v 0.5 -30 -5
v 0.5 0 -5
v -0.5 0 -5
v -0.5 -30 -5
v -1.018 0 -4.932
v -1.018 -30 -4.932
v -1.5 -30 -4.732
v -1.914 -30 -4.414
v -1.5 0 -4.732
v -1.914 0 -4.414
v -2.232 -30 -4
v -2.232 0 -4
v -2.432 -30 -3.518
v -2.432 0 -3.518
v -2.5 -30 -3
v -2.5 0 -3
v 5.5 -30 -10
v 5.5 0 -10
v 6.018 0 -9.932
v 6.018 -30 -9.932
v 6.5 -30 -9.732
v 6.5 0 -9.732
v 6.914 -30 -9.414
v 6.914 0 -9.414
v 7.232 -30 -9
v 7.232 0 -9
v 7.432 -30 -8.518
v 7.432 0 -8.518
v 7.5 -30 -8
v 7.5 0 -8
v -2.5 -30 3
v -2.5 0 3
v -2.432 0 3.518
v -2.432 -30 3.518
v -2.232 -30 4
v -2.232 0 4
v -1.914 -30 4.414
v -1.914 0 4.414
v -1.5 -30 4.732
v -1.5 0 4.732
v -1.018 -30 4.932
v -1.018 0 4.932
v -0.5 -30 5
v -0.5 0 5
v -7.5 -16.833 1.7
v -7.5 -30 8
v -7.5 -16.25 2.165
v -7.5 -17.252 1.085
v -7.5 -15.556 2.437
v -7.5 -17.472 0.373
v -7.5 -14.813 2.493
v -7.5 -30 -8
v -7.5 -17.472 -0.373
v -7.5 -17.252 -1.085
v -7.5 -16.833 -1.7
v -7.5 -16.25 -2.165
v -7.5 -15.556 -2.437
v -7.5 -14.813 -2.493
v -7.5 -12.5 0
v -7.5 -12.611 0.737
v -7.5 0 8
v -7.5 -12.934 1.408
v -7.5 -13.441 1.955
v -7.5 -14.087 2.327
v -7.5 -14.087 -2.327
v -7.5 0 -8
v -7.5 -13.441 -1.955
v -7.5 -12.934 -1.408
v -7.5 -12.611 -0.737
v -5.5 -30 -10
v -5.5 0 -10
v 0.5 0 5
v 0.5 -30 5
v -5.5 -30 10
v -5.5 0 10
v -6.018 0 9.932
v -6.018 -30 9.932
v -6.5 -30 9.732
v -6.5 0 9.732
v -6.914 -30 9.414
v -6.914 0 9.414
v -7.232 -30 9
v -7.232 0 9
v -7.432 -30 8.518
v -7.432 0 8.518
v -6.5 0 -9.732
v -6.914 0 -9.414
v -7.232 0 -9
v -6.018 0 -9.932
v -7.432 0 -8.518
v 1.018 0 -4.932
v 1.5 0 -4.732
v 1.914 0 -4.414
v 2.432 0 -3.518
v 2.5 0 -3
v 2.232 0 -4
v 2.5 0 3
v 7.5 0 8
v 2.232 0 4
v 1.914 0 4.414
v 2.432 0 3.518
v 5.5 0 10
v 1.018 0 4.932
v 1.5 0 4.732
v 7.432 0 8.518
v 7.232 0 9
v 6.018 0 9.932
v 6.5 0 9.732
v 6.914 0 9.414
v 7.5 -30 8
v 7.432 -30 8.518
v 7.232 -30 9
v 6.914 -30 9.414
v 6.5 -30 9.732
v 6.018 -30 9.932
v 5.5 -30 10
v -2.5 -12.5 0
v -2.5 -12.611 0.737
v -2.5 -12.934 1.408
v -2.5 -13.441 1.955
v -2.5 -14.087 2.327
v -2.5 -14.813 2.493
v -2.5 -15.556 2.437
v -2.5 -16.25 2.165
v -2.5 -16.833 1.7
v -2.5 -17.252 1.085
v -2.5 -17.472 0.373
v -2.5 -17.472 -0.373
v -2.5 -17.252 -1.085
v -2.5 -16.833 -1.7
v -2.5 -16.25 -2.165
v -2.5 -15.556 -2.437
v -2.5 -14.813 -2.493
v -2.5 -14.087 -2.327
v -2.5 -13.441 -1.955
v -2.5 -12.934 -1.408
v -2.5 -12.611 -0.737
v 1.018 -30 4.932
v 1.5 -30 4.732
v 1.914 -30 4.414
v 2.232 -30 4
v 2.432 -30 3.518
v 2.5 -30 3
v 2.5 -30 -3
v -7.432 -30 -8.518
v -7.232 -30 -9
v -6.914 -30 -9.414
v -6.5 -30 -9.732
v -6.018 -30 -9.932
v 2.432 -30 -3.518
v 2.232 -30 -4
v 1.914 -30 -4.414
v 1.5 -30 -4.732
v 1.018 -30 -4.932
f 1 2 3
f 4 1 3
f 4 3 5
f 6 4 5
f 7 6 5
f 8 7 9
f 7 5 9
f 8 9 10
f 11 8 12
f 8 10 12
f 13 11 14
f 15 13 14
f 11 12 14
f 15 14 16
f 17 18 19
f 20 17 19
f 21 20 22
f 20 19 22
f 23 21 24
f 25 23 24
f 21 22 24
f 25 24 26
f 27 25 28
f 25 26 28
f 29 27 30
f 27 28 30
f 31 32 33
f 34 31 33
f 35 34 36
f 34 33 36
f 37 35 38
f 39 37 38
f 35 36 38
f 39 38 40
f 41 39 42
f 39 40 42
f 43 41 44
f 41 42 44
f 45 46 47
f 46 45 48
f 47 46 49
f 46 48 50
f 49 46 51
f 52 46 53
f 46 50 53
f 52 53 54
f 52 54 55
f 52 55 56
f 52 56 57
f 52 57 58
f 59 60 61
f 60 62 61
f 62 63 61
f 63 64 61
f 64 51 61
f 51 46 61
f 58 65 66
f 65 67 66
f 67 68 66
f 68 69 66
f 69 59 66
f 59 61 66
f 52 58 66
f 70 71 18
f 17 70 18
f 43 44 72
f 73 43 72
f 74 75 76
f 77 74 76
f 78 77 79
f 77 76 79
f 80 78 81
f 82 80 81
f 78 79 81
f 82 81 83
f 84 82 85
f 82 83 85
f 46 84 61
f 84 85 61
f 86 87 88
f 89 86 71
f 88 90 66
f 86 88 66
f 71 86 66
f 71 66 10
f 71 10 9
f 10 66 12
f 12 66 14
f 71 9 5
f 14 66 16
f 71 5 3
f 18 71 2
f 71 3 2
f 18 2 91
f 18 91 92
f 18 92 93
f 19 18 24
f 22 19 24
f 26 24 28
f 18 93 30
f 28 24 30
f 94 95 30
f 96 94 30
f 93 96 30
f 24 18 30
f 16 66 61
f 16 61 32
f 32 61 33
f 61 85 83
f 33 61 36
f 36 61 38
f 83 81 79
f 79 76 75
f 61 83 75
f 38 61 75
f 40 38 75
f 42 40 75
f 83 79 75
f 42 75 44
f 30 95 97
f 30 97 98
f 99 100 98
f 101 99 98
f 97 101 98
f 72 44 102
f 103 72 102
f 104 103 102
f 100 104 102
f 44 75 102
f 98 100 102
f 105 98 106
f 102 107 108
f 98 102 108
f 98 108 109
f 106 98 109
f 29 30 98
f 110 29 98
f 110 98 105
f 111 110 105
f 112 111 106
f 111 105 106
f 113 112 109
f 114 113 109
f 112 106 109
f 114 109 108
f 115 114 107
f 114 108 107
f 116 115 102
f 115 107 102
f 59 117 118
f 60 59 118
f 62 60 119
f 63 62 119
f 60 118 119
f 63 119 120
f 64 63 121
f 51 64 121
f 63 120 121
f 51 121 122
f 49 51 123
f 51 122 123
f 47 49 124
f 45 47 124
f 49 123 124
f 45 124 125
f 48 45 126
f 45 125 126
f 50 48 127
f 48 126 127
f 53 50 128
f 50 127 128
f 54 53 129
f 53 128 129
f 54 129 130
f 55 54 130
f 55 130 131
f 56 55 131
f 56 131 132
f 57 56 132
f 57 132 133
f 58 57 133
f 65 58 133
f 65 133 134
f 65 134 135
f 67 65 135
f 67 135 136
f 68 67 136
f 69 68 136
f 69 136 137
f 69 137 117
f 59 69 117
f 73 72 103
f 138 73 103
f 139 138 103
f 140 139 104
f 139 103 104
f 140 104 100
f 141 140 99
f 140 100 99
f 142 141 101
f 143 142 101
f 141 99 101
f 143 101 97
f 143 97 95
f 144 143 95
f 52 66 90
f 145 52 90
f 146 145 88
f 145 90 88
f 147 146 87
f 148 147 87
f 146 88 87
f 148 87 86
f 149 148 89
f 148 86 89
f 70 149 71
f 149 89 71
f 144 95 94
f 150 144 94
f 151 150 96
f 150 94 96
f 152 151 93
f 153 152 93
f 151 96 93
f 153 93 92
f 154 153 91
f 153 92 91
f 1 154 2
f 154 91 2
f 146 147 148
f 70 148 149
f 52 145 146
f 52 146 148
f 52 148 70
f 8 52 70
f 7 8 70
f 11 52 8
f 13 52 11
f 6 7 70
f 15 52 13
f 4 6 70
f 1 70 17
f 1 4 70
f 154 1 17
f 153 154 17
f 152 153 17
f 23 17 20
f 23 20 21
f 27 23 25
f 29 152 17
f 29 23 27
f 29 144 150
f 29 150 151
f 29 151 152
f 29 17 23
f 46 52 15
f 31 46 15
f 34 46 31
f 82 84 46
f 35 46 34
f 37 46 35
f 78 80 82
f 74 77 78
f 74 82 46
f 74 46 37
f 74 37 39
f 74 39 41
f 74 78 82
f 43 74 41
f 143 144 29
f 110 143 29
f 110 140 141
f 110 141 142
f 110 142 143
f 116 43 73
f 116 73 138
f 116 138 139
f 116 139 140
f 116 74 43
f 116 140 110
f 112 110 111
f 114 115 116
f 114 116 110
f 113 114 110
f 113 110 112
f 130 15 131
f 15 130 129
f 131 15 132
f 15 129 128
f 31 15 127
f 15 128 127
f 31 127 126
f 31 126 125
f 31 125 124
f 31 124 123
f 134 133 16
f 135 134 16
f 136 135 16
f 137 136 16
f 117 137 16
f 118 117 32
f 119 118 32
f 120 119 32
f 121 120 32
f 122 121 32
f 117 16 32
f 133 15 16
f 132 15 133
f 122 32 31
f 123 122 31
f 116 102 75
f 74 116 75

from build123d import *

# Parameters (mm, degrees)
F1_DEPTH = 30
F2_R     = 2.5
F3_DEPTH = 30


with BuildPart() as f1:
    # F0 (on Front) → F1 (new body)
    with BuildSketch(Plane.XZ):
        with BuildLine():
            ThreePointArc((7.5, 8), (6.914214, 9.414214), (5.5, 10))
            Line((5.5, 10), (-5.5, 10))
            ThreePointArc((-5.5, 10), (-6.914214, 9.414214), (-7.5, 8))
            Line((-7.5, 8), (-7.5, -8))
            ThreePointArc((-7.5, -8), (-6.914214, -9.414214), (-5.5, -10))
            Line((-5.5, -10), (5.5, -10))
            ThreePointArc((5.5, -10), (6.914214, -9.414214), (7.5, -8))
            Line((7.5, -8), (7.5, 8))
        make_face()
        with BuildLine():
            Line((-0.5, 5), (0.5, 5))
            ThreePointArc((0.5, 5), (1.914214, 4.414214), (2.5, 3))
            Line((2.5, 3), (2.5, -3))
            ThreePointArc((2.5, -3), (1.914214, -4.414214), (0.5, -5))
            Line((0.5, -5), (-0.5, -5))
            ThreePointArc((-0.5, -5), (-1.914214, -4.414214), (-2.5, -3))
            Line((-2.5, -3), (-2.5, 3))
            ThreePointArc((-2.5, 3), (-1.914214, 4.414214), (-0.5, 5))
        make_face(mode=Mode.SUBTRACT)
    extrude(amount=F1_DEPTH)

    # F2 (on Right) → F3 (cut)
    with BuildSketch(Plane.YZ):
        with Locations((-15, 0)):
            Circle(F2_R)
    extrude(amount=-F3_DEPTH, mode=Mode.SUBTRACT)


solid = f1.part
